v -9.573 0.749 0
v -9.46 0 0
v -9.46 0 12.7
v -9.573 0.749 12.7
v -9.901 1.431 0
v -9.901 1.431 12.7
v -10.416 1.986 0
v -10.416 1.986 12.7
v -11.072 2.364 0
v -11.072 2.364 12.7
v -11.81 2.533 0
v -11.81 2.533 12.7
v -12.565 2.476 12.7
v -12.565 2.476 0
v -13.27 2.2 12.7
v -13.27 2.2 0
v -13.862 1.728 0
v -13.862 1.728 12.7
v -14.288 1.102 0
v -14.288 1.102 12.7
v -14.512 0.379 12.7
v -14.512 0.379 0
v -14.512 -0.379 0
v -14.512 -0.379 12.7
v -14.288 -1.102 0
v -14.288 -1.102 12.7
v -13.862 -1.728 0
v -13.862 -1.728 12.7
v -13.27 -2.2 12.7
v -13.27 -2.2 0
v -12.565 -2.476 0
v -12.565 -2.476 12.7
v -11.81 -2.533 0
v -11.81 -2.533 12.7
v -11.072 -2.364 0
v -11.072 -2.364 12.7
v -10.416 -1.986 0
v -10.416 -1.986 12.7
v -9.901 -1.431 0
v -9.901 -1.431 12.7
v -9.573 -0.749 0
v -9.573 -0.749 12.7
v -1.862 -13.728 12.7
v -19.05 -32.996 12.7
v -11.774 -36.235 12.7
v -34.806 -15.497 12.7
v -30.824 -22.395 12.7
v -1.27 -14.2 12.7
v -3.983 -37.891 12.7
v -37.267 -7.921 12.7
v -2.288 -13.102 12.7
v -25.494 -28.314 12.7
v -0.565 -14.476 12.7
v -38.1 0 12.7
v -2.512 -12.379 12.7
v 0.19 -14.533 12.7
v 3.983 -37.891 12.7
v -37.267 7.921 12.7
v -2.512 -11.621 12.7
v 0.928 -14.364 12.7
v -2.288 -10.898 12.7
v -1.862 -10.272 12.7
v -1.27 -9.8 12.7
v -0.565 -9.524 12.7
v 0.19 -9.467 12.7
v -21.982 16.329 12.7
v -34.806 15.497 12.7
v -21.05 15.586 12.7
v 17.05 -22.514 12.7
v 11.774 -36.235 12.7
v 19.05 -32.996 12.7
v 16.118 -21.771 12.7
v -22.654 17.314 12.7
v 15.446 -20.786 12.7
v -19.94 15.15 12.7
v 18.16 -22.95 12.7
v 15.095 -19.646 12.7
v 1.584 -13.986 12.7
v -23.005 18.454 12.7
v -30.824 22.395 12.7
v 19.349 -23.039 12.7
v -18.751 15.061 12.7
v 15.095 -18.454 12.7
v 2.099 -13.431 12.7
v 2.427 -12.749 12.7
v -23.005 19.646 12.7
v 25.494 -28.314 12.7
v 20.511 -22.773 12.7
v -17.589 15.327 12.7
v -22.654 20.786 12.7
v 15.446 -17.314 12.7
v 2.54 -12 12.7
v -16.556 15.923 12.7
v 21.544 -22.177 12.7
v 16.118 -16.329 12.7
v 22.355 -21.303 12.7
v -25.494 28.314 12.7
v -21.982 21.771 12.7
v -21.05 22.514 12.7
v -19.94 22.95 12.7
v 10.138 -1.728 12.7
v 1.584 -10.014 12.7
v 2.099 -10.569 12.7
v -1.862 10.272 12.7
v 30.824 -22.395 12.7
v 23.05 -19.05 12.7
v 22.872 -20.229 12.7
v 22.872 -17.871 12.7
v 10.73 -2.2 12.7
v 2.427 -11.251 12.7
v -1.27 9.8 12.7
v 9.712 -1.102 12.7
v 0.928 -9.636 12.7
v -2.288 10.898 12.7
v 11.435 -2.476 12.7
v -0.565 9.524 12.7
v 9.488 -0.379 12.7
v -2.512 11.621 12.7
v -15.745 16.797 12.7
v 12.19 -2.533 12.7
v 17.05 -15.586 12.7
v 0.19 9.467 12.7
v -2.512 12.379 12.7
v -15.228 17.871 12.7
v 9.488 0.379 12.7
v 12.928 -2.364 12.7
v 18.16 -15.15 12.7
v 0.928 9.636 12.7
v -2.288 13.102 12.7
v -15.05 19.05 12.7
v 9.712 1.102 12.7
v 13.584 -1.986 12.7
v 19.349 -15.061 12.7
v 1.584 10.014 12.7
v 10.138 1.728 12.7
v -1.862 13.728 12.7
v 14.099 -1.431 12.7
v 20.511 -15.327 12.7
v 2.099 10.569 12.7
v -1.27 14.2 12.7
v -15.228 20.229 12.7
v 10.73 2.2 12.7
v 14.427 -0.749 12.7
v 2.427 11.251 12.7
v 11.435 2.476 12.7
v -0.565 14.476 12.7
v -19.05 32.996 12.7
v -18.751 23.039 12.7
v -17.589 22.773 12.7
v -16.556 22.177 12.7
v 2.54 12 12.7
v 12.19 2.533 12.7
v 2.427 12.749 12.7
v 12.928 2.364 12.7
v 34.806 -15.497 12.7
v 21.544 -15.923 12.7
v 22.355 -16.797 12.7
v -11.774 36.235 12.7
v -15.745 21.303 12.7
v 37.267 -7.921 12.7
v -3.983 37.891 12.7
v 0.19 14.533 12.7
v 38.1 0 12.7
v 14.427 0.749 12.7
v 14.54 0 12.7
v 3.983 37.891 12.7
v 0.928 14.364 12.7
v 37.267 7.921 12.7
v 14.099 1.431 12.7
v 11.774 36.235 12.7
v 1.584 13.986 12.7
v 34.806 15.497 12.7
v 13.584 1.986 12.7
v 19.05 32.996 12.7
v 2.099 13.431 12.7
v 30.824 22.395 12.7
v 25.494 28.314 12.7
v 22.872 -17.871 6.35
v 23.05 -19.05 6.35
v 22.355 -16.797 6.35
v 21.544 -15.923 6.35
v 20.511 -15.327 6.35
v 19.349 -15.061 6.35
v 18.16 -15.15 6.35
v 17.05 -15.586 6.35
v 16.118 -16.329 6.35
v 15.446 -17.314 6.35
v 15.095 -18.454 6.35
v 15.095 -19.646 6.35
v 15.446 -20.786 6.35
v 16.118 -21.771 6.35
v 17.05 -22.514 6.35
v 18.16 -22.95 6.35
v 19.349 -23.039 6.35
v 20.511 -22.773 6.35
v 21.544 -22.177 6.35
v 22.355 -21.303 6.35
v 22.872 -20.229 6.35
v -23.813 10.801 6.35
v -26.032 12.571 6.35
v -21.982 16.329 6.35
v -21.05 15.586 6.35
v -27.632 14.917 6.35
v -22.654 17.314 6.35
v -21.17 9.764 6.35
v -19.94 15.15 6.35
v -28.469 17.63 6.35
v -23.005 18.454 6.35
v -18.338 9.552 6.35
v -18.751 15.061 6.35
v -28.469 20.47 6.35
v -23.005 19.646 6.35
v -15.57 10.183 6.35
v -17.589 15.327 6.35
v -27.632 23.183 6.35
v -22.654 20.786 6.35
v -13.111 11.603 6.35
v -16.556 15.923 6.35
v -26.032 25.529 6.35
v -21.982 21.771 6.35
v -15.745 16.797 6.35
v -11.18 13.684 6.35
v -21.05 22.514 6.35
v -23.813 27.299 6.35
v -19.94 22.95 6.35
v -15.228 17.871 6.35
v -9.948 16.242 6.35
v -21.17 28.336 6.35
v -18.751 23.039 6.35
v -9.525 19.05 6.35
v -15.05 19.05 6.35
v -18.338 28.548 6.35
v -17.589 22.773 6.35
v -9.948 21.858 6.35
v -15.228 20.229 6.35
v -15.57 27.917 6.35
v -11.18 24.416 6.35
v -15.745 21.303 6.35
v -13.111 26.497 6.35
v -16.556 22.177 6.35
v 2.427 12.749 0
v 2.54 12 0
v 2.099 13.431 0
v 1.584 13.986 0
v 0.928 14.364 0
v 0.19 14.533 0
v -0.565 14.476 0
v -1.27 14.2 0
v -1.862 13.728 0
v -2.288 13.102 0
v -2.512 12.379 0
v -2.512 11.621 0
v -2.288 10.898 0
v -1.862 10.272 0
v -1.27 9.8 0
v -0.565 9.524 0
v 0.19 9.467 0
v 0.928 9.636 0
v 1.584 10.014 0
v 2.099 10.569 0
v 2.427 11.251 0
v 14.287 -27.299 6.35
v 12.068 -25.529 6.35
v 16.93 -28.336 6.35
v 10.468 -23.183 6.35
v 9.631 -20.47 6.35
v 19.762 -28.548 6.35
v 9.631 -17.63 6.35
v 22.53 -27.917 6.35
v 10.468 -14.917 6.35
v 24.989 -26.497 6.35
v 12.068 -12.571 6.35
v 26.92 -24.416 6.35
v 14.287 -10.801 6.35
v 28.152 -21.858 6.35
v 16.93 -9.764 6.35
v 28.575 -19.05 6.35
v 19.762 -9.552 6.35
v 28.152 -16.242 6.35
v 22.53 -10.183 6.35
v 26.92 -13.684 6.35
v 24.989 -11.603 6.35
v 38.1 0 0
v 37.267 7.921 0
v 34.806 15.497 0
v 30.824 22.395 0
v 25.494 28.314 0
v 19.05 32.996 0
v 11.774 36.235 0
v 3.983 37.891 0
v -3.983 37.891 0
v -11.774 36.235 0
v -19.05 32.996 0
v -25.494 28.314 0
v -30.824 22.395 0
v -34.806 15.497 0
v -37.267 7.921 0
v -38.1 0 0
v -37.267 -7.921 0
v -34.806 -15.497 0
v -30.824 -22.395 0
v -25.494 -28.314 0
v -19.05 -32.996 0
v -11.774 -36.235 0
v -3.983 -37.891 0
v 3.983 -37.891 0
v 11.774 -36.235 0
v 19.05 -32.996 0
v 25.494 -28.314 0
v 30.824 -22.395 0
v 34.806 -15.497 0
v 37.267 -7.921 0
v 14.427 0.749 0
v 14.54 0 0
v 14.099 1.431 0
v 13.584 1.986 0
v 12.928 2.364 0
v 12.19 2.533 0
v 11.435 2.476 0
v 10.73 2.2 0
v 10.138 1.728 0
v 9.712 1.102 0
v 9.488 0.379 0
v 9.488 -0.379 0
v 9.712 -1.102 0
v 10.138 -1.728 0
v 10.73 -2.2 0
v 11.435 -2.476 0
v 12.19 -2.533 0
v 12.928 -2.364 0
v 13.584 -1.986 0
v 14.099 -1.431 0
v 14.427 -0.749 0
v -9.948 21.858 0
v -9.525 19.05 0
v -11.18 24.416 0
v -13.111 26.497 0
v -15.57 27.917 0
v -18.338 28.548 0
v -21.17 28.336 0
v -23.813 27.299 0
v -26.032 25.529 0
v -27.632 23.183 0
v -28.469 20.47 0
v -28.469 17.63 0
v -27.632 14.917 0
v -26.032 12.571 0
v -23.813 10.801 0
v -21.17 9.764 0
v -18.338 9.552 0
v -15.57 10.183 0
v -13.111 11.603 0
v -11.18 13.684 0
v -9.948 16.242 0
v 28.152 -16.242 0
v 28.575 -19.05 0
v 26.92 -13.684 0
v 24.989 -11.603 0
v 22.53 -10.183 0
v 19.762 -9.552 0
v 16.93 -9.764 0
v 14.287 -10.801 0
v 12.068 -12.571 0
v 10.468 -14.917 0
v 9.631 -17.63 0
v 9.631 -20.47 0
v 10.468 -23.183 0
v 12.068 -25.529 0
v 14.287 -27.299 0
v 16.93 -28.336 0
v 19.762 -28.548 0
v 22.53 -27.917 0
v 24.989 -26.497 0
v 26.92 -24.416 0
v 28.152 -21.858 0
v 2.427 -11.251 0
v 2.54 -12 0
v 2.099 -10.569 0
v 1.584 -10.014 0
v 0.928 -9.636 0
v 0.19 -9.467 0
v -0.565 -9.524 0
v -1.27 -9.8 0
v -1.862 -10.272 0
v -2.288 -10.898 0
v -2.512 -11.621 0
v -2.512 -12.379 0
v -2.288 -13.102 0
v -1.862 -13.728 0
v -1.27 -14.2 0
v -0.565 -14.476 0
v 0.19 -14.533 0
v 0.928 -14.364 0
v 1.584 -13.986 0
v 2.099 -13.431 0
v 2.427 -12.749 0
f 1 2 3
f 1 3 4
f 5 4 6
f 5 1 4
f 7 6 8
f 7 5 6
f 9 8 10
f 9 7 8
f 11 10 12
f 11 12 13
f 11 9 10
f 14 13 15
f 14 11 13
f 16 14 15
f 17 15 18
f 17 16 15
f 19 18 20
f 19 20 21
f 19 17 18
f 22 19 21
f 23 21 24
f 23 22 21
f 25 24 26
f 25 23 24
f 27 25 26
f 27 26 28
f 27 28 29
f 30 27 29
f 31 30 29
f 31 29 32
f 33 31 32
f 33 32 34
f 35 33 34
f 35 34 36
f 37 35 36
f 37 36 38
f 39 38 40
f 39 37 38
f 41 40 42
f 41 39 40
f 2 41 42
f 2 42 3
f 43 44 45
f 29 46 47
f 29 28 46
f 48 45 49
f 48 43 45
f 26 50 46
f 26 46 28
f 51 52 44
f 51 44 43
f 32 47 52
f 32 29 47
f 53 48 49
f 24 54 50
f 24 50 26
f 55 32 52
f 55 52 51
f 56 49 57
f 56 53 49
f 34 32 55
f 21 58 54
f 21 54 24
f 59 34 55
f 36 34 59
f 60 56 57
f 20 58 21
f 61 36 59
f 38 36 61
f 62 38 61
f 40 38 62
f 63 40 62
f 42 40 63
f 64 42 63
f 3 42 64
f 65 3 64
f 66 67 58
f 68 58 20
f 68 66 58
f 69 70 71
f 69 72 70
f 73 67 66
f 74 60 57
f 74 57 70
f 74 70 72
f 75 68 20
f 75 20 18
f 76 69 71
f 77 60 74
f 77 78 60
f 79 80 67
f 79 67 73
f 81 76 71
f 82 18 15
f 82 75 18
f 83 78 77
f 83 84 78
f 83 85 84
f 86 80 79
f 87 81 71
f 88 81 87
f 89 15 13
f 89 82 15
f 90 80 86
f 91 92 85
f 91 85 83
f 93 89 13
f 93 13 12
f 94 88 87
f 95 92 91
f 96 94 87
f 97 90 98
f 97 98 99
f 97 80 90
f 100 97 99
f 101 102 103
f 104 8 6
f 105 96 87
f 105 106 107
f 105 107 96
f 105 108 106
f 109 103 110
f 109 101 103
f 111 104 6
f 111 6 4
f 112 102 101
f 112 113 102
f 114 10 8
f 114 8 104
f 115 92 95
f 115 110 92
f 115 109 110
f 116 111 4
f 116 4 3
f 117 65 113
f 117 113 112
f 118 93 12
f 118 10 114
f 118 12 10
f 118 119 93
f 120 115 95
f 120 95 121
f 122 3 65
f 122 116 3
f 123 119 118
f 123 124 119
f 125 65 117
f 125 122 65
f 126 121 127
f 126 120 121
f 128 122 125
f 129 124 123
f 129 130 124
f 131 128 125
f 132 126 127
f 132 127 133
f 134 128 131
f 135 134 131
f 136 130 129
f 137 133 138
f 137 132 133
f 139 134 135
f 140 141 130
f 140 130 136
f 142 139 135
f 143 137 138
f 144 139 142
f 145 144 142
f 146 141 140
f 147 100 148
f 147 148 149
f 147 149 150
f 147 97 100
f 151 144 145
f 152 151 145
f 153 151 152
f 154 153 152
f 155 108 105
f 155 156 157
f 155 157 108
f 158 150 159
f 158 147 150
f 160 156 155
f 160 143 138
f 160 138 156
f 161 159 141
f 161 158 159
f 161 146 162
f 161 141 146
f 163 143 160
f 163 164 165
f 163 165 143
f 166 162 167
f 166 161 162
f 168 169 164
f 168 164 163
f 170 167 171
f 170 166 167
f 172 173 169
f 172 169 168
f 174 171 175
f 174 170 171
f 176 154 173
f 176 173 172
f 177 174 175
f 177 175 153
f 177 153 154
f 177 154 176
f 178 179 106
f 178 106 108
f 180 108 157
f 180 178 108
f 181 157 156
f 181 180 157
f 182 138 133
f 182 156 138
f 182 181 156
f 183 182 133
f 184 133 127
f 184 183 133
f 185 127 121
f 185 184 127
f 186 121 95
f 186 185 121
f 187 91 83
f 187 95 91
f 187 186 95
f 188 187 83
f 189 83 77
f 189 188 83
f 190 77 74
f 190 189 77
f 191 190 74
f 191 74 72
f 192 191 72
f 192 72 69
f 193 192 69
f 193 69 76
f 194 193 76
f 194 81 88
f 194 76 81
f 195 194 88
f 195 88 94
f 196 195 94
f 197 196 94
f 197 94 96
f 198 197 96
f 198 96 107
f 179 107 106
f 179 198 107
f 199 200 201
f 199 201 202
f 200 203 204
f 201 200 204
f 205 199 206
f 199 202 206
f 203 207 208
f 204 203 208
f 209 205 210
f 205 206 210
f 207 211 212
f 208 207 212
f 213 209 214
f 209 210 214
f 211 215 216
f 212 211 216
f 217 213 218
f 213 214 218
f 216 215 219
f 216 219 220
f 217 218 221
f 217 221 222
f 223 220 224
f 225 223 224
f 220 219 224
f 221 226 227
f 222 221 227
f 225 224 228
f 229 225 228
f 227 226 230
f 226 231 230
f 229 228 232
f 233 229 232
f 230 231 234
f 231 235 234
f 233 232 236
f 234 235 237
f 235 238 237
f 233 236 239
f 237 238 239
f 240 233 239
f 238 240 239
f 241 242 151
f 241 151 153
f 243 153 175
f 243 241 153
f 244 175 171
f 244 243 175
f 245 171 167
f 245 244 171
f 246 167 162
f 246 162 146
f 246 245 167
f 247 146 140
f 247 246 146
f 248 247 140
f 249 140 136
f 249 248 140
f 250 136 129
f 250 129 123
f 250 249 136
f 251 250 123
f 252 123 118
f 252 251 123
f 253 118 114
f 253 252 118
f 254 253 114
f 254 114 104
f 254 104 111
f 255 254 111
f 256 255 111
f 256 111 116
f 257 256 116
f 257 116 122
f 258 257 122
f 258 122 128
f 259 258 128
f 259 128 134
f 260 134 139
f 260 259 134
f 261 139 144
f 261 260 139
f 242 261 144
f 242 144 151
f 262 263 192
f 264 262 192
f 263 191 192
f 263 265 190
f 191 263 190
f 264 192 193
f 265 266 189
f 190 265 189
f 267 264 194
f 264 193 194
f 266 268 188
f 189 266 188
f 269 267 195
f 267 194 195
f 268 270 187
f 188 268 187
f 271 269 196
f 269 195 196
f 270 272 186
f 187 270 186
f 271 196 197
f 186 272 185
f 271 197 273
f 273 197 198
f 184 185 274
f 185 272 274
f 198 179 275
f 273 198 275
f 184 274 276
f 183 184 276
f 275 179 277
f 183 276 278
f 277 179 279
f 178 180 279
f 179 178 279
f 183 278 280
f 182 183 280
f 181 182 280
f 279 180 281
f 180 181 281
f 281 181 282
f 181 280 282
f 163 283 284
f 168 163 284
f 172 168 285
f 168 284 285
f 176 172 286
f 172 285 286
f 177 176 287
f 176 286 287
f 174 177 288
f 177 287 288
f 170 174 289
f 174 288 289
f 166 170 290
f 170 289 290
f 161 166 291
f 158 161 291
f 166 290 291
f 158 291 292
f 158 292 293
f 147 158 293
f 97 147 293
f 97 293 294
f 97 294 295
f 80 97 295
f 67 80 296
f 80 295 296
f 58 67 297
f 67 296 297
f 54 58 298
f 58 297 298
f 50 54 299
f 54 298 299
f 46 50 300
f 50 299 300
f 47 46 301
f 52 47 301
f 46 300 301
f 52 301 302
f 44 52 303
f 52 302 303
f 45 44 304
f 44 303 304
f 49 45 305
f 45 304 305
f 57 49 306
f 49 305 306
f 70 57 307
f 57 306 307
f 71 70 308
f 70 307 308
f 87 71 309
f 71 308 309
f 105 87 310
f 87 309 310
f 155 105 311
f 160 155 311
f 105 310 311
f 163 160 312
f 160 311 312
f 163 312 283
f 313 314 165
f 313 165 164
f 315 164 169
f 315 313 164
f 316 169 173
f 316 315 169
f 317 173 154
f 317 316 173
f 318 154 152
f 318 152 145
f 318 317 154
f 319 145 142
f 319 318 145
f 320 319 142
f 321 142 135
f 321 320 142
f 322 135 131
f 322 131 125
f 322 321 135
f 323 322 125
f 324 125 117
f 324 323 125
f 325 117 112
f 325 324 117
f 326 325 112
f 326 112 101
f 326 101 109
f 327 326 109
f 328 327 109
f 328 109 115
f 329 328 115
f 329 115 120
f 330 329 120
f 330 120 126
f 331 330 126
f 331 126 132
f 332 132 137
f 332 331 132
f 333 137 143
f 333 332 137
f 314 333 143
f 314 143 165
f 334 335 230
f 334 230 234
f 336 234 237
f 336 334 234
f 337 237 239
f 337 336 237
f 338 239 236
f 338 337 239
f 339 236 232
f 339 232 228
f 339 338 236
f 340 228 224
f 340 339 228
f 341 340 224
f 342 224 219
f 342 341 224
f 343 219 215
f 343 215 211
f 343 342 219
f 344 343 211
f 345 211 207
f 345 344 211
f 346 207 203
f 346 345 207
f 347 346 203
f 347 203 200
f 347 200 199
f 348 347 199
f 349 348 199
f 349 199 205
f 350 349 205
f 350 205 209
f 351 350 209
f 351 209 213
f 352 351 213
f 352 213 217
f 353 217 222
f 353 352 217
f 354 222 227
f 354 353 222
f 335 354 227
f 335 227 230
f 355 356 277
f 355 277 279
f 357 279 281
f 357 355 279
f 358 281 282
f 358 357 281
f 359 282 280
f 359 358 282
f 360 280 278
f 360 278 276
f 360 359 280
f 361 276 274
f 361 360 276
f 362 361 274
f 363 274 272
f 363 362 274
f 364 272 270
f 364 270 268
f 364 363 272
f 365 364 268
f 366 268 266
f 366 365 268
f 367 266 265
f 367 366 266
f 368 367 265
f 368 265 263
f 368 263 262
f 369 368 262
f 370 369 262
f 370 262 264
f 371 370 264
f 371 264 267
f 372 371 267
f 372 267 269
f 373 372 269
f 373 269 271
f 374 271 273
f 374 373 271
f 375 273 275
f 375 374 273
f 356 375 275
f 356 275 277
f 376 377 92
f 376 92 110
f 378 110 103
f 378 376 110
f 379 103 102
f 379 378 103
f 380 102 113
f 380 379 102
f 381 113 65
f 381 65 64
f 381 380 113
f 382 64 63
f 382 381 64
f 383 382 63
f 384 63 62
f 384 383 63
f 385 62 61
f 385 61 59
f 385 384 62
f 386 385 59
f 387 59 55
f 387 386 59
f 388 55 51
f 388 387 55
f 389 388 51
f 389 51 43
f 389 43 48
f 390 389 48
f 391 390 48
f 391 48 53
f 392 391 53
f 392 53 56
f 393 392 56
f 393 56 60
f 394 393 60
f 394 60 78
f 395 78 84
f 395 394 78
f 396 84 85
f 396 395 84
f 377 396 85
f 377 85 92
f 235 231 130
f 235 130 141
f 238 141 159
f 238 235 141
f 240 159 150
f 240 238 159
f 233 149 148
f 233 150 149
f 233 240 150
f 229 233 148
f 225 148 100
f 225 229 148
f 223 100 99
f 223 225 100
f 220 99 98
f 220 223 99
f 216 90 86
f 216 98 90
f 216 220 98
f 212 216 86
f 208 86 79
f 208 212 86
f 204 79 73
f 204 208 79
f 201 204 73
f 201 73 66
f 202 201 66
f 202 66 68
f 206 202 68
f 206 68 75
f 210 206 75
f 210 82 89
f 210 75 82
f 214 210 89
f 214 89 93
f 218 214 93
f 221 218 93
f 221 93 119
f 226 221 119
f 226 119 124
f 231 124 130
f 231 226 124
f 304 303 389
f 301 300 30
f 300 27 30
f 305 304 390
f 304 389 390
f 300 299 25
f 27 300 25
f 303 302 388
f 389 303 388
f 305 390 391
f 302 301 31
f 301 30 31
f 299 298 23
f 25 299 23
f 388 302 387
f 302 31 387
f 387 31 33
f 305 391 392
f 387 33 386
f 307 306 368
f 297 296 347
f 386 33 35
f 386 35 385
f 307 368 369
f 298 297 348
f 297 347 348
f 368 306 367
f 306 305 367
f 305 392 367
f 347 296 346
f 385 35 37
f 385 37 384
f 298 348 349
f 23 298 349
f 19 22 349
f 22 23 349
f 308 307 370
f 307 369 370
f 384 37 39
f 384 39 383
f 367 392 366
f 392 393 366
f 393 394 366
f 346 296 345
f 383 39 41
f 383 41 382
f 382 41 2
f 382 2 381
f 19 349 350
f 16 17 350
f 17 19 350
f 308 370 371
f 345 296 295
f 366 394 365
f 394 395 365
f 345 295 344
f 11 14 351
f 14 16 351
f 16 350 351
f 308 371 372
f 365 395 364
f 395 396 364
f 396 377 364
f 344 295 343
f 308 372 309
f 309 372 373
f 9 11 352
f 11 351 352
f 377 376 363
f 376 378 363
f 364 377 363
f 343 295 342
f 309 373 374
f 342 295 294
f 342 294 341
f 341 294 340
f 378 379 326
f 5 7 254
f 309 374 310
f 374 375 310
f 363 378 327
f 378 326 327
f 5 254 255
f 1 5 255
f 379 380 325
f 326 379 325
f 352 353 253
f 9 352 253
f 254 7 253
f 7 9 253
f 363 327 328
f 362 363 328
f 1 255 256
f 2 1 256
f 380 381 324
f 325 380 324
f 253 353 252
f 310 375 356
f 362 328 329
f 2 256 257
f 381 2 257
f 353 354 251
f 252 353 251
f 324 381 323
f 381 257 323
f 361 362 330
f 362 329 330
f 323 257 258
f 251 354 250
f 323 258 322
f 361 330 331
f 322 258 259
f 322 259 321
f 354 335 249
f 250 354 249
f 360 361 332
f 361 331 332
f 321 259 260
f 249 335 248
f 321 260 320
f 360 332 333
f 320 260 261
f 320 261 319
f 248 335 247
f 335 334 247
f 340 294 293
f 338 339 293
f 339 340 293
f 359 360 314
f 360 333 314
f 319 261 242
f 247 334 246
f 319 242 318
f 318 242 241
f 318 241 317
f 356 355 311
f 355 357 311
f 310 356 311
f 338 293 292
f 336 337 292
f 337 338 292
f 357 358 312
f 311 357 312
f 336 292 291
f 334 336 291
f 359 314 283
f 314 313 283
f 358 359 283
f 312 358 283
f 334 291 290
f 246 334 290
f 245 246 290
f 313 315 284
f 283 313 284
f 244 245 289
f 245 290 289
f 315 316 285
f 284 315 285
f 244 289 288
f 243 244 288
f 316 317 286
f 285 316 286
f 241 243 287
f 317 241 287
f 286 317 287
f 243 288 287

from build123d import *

# Parameters (mm, degrees)
SKETCH1_R           = 38.1
SKETCH1_R_2         = 2.54
BOSS_EXTRUDE1_DEPTH = 12.7
SKETCH2_R           = 4
CUT_EXTRUDE1_DEPTH  = 56.358016583
SKETCH3_R           = 9.525
CUT_EXTRUDE2_DEPTH  = 6.35
SKETCH4_R           = 4
CUT_EXTRUDE3_DEPTH  = 56.358016583
SKETCH5_R           = 9.525
CUT_EXTRUDE5_DEPTH  = 6.35


with BuildPart() as part:
    # Sketch1 → Boss-Extrude1 (new body)
    with BuildSketch(Plane.XY):
        Circle(SKETCH1_R)
        with Locations((12, 0)):
            Circle(SKETCH1_R_2, mode=Mode.SUBTRACT)
        with Locations((0, -12)):
            Circle(SKETCH1_R_2, mode=Mode.SUBTRACT)
        with Locations((-12, 0)):
            Circle(SKETCH1_R_2, mode=Mode.SUBTRACT)
        with Locations((0, 12)):
            Circle(SKETCH1_R_2, mode=Mode.SUBTRACT)
    extrude(amount=BOSS_EXTRUDE1_DEPTH)

    # Sketch2 → Cut-Extrude1 (cut, through all)
    with BuildSketch(Plane.XY):
        with Locations((19.05, -19.05)):
            Circle(SKETCH2_R)
    extrude(amount=CUT_EXTRUDE1_DEPTH, mode=Mode.SUBTRACT)

    # Sketch3 → Cut-Extrude2 (cut)
    with BuildSketch(Plane.XY):
        with Locations((19.05, -19.05)):
            Circle(SKETCH3_R)
    extrude(amount=CUT_EXTRUDE2_DEPTH, mode=Mode.SUBTRACT)

    # Sketch4 → Cut-Extrude3 (cut, through all)
    with BuildSketch(Plane.XY):
        with Locations((-19.05, 19.05)):
            Circle(SKETCH4_R)
    extrude(amount=CUT_EXTRUDE3_DEPTH, mode=Mode.SUBTRACT)

    # Sketch5 → Cut-Extrude5 (cut)
    with BuildSketch(Plane.XY):
        with Locations((-19.05, 19.05)):
            Circle(SKETCH5_R)
    extrude(amount=CUT_EXTRUDE5_DEPTH, mode=Mode.SUBTRACT)


solid = part.part
